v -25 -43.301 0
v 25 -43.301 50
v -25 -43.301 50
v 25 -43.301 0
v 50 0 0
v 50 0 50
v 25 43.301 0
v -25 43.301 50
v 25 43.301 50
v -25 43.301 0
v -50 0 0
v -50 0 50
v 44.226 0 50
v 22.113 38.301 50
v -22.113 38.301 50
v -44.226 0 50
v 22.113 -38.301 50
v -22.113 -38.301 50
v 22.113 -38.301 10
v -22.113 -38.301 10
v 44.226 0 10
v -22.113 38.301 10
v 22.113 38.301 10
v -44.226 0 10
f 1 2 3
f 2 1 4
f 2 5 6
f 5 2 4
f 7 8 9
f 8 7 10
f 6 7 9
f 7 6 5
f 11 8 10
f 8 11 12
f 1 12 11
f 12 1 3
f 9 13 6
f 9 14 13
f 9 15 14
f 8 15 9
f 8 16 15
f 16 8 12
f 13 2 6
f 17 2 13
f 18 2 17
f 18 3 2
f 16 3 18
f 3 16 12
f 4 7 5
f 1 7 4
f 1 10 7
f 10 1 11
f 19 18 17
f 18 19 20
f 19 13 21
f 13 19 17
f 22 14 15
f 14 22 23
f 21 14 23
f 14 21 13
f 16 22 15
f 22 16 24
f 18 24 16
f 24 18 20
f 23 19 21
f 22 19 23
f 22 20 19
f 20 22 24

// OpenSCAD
//$fn=30;

radius = 50;
height = 50;
wall_thickness = 5;
bottom_thickness = 10;

hexagon_cup(radius,height,wall_thickness,bottom_thickness);

// modules

module hexagon(radius, height) {
    cylinder(r=radius, h=height, $fn=6);
}

module hexagon_cup(radius, height, wall_thickness, bottom_thickness) {
    difference() {
        hexagon(radius, height);
        translate([0, 0, bottom_thickness]) {
            hexagon( (radius - wall_thickness/sin(60)) , height);
        }
    }
}
